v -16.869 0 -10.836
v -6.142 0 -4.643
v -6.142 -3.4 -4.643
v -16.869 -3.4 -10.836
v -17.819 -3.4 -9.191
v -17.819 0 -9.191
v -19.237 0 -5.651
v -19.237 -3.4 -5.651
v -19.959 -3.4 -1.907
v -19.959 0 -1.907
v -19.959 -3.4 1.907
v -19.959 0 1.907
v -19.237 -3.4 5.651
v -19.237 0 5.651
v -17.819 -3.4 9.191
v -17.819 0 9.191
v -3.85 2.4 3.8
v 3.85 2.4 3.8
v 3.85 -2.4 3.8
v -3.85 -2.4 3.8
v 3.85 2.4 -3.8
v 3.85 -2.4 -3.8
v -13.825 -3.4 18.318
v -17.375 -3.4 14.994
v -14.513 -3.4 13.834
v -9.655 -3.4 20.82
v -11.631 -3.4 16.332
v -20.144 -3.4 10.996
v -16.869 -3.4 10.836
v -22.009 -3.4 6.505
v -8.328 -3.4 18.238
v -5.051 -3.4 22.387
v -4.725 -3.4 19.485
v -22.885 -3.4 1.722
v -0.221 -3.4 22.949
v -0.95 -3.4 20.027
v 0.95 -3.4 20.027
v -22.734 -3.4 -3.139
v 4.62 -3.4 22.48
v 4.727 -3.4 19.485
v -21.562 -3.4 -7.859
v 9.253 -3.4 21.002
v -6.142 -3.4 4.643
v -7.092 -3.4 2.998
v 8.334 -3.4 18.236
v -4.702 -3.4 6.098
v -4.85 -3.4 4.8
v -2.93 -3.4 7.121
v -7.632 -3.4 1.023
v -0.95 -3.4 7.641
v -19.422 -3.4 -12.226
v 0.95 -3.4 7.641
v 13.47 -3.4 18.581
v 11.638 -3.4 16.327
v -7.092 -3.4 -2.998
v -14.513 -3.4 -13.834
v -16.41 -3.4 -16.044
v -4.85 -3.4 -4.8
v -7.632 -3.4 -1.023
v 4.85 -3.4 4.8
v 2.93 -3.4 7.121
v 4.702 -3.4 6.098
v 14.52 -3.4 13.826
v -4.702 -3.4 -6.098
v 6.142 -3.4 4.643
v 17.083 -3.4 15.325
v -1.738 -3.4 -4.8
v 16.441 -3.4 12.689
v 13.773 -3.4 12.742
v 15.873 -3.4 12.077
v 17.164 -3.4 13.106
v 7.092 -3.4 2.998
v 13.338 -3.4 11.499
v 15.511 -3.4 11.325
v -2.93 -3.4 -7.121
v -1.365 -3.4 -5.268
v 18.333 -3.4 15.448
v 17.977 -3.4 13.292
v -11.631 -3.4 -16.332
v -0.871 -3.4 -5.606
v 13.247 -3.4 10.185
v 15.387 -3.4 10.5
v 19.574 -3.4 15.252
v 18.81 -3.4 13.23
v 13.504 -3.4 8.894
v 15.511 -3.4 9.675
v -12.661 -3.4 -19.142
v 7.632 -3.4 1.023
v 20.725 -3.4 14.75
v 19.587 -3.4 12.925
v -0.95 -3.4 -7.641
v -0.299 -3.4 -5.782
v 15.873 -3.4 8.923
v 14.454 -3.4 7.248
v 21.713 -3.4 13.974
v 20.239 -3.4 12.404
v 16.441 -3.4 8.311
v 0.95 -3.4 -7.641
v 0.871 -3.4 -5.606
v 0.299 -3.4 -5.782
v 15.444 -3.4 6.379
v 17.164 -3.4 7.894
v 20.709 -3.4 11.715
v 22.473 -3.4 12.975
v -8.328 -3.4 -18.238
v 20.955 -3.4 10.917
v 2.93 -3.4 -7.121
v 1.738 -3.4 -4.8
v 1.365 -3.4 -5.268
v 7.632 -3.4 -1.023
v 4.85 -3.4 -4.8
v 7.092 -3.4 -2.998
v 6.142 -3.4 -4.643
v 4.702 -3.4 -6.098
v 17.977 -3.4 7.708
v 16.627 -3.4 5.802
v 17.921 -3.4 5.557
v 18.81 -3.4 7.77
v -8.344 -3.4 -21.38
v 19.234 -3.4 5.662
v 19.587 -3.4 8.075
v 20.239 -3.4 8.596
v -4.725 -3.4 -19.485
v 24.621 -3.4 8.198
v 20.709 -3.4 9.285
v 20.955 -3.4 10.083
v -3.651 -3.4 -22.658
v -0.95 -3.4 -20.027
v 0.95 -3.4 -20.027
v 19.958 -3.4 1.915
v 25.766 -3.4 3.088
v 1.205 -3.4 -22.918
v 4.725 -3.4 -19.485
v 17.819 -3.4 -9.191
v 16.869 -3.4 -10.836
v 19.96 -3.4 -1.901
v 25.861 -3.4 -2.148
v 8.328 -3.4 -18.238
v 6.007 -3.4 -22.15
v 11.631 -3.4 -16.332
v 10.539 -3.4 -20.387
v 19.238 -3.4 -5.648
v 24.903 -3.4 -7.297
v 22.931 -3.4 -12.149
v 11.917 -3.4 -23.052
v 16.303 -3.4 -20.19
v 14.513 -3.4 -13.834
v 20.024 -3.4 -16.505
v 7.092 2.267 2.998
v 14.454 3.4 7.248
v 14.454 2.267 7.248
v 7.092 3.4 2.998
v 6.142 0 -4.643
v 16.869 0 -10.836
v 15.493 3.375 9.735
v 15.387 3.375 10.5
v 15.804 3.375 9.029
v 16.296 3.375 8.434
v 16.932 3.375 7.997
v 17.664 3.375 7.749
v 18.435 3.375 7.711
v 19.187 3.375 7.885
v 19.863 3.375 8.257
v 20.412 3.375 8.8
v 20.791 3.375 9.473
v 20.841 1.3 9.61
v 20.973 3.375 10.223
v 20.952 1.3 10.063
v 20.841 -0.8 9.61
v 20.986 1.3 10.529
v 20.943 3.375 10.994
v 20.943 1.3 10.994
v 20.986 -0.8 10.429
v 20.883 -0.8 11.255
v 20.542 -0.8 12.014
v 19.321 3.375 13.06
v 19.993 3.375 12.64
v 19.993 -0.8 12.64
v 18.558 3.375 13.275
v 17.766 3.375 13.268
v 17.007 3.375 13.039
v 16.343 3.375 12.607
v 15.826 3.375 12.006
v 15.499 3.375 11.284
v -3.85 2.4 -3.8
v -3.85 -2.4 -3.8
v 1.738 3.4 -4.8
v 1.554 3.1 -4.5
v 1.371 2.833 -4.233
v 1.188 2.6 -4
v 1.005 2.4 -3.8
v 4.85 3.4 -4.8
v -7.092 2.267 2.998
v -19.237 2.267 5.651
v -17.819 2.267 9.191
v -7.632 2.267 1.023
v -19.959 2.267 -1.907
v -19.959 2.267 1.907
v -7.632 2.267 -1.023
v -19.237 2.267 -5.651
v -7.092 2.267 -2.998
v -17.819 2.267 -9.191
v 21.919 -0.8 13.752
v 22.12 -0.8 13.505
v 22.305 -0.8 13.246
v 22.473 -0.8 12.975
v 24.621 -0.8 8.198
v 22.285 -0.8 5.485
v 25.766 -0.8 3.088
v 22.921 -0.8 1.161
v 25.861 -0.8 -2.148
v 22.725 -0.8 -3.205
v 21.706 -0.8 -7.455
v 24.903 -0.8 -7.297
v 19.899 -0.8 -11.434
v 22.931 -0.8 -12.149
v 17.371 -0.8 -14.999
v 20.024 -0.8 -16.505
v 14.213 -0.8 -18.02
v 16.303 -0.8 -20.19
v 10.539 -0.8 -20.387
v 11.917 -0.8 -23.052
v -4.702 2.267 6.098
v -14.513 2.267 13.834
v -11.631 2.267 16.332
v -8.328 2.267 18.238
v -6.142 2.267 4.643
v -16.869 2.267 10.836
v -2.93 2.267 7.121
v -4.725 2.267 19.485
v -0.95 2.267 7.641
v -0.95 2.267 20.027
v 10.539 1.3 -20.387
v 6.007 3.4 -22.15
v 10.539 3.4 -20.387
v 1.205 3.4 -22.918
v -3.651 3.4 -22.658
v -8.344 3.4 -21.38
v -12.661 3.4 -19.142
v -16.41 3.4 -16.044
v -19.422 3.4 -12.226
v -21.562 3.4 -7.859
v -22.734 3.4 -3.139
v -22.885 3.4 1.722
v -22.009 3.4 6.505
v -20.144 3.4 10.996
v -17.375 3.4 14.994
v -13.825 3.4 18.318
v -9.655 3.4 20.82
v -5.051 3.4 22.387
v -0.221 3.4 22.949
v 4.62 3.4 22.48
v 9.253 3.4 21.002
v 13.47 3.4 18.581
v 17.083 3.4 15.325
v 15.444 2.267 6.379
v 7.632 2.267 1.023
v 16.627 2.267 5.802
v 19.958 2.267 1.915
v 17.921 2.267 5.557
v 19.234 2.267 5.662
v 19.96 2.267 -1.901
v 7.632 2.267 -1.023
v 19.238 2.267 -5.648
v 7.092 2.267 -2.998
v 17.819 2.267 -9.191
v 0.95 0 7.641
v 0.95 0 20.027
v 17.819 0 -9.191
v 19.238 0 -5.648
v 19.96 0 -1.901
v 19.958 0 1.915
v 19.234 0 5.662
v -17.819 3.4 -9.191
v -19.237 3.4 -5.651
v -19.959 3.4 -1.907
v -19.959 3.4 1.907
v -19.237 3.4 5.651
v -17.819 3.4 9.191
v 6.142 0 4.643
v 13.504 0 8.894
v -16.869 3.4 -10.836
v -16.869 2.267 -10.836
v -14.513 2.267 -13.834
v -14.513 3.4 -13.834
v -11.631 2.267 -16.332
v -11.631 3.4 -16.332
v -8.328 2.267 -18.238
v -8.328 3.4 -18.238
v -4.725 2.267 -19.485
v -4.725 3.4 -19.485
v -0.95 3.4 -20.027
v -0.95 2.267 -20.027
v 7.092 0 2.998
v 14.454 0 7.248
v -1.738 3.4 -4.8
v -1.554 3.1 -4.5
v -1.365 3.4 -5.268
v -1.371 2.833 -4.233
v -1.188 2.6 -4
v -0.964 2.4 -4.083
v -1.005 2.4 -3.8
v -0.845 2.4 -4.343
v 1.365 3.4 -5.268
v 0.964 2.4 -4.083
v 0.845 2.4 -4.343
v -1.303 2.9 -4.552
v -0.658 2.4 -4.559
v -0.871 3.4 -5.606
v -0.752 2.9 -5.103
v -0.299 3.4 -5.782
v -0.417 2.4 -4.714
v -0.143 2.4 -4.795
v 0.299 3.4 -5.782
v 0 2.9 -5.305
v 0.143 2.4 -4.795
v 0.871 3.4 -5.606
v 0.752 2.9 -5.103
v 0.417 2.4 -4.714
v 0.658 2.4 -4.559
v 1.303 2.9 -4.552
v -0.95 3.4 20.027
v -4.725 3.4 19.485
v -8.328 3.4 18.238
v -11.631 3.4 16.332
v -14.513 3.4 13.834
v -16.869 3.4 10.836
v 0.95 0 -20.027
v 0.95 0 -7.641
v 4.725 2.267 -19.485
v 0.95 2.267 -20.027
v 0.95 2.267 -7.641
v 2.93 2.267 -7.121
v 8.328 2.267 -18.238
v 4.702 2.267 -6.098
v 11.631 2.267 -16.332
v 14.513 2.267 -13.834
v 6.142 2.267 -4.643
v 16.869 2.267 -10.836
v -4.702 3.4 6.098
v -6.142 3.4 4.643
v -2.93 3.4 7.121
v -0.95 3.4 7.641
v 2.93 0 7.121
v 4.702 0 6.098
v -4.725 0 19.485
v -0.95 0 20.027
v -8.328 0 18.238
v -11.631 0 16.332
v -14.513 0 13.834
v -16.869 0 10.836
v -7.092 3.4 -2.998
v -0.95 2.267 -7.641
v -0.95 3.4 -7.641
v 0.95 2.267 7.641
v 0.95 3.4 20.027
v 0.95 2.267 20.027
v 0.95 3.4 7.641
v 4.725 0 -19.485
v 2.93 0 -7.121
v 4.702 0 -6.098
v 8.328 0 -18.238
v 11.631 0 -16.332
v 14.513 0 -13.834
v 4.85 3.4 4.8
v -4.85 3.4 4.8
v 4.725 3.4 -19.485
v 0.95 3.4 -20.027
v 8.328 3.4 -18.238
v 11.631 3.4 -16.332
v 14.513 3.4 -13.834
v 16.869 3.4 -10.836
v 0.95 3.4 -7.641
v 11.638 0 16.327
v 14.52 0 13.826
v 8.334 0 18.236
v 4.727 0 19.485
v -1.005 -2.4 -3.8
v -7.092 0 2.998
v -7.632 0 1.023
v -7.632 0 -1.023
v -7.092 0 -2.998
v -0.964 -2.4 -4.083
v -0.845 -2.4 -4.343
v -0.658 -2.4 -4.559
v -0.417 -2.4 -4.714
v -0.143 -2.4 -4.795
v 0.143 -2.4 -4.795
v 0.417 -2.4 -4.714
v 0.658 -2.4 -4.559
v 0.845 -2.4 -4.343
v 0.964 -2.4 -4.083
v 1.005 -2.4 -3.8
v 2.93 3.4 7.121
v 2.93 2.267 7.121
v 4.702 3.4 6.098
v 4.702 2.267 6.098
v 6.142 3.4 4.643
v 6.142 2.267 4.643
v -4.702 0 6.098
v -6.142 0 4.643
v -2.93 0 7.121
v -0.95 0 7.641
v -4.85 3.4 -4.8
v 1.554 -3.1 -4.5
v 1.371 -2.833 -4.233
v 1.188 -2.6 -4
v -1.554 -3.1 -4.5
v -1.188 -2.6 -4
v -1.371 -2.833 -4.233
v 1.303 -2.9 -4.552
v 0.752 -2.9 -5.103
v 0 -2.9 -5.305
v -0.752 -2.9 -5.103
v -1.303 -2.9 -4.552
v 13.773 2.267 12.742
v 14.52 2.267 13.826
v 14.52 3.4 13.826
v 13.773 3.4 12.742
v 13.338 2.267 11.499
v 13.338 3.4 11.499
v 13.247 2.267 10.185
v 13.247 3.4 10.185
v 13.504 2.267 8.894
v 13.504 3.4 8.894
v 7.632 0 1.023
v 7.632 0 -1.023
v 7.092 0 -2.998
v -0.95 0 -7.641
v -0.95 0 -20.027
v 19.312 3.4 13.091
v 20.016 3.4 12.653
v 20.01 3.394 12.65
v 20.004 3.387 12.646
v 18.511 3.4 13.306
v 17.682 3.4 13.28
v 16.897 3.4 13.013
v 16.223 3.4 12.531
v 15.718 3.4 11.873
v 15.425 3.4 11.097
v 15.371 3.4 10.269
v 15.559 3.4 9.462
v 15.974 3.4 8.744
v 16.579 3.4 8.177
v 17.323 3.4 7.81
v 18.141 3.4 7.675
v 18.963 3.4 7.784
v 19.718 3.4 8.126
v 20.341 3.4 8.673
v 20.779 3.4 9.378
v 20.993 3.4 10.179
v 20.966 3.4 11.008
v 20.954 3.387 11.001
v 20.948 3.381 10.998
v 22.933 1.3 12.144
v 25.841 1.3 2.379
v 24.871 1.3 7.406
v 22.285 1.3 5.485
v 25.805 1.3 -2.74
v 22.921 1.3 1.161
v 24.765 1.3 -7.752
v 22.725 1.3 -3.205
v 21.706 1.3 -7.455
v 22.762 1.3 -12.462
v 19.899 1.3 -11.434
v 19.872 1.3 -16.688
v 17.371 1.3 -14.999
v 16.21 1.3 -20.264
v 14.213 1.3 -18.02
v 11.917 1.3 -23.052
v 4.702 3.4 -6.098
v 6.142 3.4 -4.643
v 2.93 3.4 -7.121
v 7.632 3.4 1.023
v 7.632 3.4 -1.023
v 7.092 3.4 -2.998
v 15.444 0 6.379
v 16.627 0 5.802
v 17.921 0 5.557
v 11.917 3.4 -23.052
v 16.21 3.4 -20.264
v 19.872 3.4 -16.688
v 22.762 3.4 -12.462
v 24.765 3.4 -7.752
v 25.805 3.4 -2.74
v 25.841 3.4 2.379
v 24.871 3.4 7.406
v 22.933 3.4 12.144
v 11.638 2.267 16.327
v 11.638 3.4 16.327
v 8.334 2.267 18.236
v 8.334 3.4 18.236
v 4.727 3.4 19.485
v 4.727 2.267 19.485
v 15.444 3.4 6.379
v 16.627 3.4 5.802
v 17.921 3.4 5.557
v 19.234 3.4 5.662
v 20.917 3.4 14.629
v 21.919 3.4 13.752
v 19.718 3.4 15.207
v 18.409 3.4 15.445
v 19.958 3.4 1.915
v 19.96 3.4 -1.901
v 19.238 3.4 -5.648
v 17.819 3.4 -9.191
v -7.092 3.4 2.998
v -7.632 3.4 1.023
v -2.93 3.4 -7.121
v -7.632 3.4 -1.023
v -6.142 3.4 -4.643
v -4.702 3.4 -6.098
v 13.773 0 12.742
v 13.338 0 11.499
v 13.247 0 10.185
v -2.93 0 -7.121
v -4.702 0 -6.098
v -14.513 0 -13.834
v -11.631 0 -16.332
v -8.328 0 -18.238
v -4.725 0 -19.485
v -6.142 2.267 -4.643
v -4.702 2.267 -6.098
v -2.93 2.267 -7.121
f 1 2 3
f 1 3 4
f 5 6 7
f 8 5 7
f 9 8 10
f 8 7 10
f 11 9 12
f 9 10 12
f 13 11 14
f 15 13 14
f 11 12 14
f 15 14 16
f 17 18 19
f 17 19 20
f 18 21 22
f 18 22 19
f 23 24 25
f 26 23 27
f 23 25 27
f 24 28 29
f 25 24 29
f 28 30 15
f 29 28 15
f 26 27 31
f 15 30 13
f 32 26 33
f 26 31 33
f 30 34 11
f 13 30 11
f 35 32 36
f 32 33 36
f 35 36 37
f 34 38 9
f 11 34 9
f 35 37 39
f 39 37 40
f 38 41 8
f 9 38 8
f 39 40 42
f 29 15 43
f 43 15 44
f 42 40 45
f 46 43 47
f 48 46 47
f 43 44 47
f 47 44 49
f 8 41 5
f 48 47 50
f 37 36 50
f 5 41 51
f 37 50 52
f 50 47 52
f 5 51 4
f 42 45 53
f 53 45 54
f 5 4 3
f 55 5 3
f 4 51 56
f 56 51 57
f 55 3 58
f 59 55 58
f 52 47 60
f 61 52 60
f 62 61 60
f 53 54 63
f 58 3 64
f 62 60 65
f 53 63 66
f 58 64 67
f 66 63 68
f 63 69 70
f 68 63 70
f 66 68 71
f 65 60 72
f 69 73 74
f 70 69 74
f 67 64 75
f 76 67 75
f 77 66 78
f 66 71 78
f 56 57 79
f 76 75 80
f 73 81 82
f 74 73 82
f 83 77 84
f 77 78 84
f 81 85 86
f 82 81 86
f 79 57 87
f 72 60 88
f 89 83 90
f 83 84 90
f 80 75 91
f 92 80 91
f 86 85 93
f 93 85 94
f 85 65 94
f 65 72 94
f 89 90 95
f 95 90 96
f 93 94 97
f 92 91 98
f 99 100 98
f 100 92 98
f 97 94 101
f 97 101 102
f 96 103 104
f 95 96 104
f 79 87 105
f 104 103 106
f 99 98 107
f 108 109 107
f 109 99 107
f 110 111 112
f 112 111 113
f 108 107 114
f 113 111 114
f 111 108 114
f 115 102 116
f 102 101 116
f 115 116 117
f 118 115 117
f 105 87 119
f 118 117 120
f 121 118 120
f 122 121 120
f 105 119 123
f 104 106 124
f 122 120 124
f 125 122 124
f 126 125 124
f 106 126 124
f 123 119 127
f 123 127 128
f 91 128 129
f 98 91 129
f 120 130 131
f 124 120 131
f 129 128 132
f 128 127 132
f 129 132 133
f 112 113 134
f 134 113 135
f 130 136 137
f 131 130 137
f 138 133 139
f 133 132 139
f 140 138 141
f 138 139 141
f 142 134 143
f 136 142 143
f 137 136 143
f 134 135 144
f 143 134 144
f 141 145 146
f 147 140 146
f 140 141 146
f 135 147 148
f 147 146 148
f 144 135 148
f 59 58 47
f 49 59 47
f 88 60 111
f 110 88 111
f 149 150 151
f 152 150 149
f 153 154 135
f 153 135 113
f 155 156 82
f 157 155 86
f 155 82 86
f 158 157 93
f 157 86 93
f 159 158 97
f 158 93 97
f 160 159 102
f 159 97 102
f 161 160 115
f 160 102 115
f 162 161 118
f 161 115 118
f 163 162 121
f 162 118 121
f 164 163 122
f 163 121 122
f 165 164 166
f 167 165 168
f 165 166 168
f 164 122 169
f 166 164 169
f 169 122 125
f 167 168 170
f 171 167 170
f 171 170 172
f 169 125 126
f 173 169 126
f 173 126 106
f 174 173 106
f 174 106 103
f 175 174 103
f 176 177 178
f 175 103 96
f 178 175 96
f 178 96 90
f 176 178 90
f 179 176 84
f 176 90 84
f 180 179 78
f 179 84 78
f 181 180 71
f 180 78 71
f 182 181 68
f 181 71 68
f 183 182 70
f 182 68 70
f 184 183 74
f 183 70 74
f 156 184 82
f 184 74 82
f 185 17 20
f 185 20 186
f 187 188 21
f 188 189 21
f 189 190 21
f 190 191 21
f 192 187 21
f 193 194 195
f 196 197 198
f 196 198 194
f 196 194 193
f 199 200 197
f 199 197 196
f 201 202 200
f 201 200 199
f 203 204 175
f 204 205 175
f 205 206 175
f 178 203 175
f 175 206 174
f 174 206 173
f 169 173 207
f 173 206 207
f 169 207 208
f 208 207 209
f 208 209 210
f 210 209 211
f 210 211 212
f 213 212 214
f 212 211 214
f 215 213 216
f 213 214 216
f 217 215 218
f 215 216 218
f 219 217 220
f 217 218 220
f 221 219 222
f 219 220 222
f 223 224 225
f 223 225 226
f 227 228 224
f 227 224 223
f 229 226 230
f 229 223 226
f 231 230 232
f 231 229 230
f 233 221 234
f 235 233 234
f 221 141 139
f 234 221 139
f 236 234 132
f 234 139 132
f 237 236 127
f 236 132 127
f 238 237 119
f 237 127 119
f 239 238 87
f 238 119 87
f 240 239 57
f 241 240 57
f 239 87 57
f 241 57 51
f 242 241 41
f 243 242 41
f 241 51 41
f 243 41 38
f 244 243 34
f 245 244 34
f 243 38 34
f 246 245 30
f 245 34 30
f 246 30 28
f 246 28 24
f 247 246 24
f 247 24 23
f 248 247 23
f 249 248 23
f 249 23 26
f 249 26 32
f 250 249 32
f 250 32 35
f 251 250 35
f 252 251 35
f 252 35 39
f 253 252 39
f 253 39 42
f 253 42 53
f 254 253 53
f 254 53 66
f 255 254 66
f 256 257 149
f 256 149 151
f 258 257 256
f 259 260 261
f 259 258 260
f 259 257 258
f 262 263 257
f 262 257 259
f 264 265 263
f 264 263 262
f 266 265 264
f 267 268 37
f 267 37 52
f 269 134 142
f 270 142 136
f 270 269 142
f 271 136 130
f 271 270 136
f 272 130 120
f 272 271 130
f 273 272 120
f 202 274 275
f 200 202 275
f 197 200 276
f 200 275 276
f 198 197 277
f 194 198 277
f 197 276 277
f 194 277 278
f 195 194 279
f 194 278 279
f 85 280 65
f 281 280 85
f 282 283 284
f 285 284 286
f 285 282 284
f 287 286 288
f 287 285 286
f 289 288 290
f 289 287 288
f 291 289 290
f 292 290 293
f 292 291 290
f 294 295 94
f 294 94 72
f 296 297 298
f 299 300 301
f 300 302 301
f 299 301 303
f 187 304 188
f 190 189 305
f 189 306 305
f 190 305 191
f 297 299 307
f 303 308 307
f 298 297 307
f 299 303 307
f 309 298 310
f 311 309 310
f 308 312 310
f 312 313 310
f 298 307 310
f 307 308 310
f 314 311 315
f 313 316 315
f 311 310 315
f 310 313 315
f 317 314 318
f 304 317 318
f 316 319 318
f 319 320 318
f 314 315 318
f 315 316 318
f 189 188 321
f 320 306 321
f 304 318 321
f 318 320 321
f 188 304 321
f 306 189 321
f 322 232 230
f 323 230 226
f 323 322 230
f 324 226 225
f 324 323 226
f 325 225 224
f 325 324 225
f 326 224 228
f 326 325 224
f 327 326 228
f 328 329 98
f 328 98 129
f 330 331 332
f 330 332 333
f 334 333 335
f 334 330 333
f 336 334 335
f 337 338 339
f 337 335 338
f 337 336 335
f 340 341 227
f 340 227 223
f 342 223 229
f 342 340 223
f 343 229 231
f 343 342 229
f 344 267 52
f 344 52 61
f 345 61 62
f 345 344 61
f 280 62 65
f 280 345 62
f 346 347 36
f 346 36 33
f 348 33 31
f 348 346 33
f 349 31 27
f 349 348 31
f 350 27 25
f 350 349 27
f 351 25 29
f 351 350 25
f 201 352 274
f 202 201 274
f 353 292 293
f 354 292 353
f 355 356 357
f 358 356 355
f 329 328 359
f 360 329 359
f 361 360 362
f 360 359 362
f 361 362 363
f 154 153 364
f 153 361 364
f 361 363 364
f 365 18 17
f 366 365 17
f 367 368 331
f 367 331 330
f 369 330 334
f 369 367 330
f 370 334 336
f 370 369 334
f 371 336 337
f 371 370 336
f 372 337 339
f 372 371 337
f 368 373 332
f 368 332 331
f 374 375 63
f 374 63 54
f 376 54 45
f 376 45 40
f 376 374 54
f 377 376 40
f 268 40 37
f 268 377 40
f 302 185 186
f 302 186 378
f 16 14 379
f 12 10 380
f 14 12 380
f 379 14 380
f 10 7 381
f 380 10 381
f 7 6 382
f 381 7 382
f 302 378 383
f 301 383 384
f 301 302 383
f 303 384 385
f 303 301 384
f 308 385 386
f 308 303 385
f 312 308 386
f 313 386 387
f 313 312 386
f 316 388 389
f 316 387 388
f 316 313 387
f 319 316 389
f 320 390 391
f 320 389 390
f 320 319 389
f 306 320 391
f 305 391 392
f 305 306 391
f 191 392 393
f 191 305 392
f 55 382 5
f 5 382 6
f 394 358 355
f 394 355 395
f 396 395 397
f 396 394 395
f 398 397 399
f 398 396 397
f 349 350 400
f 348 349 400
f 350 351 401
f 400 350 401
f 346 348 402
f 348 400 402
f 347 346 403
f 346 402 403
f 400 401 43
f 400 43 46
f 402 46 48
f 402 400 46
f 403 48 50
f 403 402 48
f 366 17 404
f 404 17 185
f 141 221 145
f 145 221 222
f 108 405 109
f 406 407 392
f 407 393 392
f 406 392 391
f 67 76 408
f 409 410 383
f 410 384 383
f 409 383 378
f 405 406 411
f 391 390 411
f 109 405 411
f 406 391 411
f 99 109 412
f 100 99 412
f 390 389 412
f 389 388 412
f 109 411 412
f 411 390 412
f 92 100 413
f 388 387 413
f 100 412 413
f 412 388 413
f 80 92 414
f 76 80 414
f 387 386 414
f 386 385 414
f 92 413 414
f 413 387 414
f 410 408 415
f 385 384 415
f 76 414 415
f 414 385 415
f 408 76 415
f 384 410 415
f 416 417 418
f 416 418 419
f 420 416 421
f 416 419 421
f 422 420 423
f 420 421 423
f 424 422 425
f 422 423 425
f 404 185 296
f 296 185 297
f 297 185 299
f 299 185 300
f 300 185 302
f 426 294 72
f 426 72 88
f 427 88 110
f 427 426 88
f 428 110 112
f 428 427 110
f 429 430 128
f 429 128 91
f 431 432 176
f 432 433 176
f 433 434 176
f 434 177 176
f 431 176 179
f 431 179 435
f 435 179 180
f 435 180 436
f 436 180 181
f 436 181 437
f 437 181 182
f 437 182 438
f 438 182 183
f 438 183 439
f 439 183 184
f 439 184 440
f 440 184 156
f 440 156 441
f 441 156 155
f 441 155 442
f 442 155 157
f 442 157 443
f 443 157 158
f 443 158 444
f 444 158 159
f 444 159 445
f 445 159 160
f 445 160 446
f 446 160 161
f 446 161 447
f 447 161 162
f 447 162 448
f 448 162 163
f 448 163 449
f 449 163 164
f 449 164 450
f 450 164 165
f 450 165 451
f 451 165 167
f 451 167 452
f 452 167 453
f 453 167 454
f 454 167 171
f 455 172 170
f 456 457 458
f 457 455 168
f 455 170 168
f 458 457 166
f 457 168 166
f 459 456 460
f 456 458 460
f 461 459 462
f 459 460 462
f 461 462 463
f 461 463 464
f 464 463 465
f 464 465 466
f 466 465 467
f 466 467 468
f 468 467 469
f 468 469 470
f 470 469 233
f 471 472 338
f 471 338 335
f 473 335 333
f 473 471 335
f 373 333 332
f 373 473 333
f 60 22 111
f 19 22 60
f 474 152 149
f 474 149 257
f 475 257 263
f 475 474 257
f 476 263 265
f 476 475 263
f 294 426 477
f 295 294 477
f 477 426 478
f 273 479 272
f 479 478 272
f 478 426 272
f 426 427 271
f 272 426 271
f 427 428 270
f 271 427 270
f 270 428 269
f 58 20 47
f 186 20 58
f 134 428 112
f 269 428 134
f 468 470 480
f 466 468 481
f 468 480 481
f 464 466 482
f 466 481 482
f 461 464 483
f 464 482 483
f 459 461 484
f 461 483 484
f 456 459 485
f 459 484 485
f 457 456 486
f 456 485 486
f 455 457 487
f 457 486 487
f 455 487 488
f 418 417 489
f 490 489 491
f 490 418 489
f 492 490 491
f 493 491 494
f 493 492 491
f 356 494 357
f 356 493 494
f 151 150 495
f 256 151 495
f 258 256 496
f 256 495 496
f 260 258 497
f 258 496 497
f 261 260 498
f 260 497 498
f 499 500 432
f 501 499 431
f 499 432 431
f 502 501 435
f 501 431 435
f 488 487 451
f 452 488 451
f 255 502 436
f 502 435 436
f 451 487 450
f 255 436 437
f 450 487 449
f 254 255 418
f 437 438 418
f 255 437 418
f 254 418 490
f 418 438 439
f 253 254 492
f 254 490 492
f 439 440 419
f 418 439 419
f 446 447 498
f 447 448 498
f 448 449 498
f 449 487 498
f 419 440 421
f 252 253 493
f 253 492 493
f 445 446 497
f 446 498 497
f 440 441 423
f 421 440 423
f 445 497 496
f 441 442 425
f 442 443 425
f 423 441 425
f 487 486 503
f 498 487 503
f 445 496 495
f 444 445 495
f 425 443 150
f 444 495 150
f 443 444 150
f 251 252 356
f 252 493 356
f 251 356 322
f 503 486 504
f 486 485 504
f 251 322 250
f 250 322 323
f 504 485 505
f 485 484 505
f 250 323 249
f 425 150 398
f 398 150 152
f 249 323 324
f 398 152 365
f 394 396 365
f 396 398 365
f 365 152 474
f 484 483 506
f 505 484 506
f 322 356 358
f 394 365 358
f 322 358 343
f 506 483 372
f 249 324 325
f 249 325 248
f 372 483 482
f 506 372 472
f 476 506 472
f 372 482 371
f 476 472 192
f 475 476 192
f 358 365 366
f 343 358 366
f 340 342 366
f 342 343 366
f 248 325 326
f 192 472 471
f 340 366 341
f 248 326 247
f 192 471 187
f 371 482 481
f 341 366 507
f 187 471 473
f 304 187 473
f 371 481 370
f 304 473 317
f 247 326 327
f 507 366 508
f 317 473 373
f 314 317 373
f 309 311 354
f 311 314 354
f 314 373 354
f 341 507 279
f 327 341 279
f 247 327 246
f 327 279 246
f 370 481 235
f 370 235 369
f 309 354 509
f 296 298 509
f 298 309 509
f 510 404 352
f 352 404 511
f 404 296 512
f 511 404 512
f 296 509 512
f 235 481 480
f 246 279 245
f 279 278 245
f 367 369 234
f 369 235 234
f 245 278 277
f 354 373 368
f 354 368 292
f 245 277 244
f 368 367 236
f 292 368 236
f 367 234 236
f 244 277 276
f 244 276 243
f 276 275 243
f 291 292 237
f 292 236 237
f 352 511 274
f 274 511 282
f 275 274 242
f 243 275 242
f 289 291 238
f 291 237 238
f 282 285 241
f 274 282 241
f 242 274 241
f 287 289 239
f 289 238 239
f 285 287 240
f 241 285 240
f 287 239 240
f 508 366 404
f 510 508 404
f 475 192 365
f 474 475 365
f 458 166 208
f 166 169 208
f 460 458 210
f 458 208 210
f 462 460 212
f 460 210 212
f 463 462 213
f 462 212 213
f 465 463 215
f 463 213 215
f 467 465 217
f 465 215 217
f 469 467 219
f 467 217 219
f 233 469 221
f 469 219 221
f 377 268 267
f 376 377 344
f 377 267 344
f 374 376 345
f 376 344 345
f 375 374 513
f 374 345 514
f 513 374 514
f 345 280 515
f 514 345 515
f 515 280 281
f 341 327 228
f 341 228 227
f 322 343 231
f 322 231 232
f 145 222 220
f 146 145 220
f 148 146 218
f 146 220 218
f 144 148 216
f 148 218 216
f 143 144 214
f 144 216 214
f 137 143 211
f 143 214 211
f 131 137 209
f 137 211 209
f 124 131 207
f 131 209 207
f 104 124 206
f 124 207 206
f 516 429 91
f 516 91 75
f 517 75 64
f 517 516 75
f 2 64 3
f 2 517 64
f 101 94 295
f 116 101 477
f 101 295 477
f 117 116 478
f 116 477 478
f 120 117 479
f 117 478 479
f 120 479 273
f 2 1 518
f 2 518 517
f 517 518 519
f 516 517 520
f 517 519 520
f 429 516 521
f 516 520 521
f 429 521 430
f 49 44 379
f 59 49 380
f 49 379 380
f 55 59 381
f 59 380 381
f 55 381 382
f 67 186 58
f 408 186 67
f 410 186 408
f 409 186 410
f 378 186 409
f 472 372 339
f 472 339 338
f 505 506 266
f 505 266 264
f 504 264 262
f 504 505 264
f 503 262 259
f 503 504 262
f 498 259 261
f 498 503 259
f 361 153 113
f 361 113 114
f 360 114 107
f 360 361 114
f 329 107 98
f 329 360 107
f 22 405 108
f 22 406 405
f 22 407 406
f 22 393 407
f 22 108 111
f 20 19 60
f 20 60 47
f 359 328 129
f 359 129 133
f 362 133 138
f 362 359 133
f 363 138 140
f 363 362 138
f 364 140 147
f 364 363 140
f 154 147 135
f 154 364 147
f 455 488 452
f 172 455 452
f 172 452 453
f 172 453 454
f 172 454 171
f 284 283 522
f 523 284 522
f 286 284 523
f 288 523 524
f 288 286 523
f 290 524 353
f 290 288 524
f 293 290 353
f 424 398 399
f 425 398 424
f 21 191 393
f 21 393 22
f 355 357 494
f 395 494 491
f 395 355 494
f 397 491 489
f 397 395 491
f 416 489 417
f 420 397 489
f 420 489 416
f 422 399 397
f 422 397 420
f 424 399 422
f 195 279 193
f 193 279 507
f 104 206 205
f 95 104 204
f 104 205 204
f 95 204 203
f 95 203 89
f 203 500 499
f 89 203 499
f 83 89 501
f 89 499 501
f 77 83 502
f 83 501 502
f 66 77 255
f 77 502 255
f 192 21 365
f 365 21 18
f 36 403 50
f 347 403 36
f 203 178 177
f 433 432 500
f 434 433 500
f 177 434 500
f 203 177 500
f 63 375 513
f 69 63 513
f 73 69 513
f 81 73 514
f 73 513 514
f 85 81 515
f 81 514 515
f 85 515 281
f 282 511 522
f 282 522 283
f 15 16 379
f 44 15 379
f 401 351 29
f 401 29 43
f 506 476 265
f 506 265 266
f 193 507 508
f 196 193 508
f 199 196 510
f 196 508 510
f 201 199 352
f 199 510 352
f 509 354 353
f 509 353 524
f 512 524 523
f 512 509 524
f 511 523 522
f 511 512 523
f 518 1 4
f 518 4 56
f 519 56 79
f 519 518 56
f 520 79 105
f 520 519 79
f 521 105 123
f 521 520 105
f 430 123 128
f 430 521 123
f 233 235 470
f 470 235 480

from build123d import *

# Parameters (mm, degrees)
ESBO_O1_R                              = 22.95
RESSALTO_EXTRUS_O1_DEPTH               = 3.4
ESBO_O2_R                              = 22.95
RESSALTO_EXTRUS_O2_DEPTH               = 2.266666667
CORTE_EXTRUS_O1_DEPTH                  = 7.8
CHANFRO1_SIZE                          = 1
RESSALTO_EXTRUS_O3_DEPTH               = 6.8
FURO_DE_DI_METRO_5_6_5_6_1_D           = 5.6
FURO_DE_DI_METRO_5_6_5_6_1_DEPTH       = 10
FURO_DE_DI_METRO_5_6_5_6_1_CSINK_D     = 5.65
FURO_DE_DI_METRO_5_6_5_6_1_CSINK_ANGLE = 90
FURO_DE_DI_METRO_5_6_5_6_1_TIP         = 1.682409733
ESBO_O8_W                              = 7.937144563
ESBO_O8_H                              = 2.1
CORTE_EXTRUS_O2_DEPTH                  = 4.2


with BuildPart() as part:
    # Esboço1 → Ressalto-extrusão1 (new body, symmetric)
    with BuildSketch(Plane(origin=(0, 0, 0), x_dir=(1, 0, 0), z_dir=(0, 1, 0))):
        Circle(ESBO_O1_R)
        with BuildLine():
            Line((-7.092448526, 2.997861554), (-17.819307423, 9.191016426))
            ThreePointArc((-17.819307423, 9.191016426), (-20.05, 0), (-17.819307423, -9.191016426))
            Line((-17.819307423, -9.191016426), (-7.092448526, -2.997861554))
            ThreePointArc((-7.092448526, -2.997861554), (-7.7, 0), (-7.092448526, 2.997861554))
        make_face(mode=Mode.SUBTRACT)
        with BuildLine():
            Line((-6.142448526, 4.643309822), (-16.869307423, 10.836464693))
            ThreePointArc((-16.869307423, 10.836464693), (-10.025, 17.363809346), (-0.95, 20.02748112))
            Line((-0.95, 20.02748112), (-0.95, 7.641171376))
            ThreePointArc((-0.95, 7.641171376), (-3.85, 6.668395609), (-6.142448526, 4.643309822))
        make_face(mode=Mode.SUBTRACT)
        with BuildLine():
            Line((0.95, 7.641171376), (0.95, 20.02748112))
            ThreePointArc((0.95, 20.02748112), (10.025, 17.363809346), (16.869307423, 10.836464693))
            Line((16.869307423, 10.836464693), (6.142448526, 4.643309822))
            ThreePointArc((6.142448526, 4.643309822), (3.85, 6.668395609), (0.95, 7.641171376))
        make_face(mode=Mode.SUBTRACT)
        with BuildLine():
            Line((7.092448526, 2.997861554), (17.819307423, 9.191016426))
            ThreePointArc((17.819307423, 9.191016426), (20.05, 0), (17.819307423, -9.191016426))
            Line((17.819307423, -9.191016426), (7.092448526, -2.997861554))
            ThreePointArc((7.092448526, -2.997861554), (7.7, 0), (7.092448526, 2.997861554))
        make_face(mode=Mode.SUBTRACT)
        with BuildLine():
            Line((6.142448526, -4.643309822), (16.869307423, -10.836464693))
            ThreePointArc((16.869307423, -10.836464693), (10.025, -17.363809346), (0.95, -20.02748112))
            Line((0.95, -20.02748112), (0.95, -7.641171376))
            ThreePointArc((0.95, -7.641171376), (3.85, -6.668395609), (6.142448526, -4.643309822))
        make_face(mode=Mode.SUBTRACT)
        with BuildLine():
            Line((-0.95, -7.641171376), (-0.95, -20.02748112))
            ThreePointArc((-0.95, -20.02748112), (-10.025, -17.363809346), (-16.869307423, -10.836464693))
            Line((-16.869307423, -10.836464693), (-6.142448526, -4.643309822))
            ThreePointArc((-6.142448526, -4.643309822), (-3.85, -6.668395609), (-0.95, -7.641171376))
        make_face(mode=Mode.SUBTRACT)
    extrude(amount=RESSALTO_EXTRUS_O1_DEPTH, both=True)

    # Esboço2 → Ressalto-extrusão2 (add)
    with BuildSketch(Plane(origin=(0, 0, 0), x_dir=(1, 0, 0), z_dir=(0, 1, 0))):
        Circle(ESBO_O2_R)
    extrude(amount=RESSALTO_EXTRUS_O2_DEPTH)

    # Esboço3 → Corte-extrusão1 (cut, through all)
    with BuildSketch(Plane(origin=(0, 3.4, 0), x_dir=(1, 0, 0), z_dir=(0, 1, 0))):
        with BuildLine():
            Line((1.00475453, 3.8), (3.85, 3.8))
            Line((3.85, 3.8), (3.85, -3.8))
            Line((3.85, -3.8), (-3.85, -3.8))
            Line((-3.85, -3.8), (-3.85, 3.8))
            Line((-3.85, 3.8), (-1.00475453, 3.8))
            ThreePointArc((-1.00475453, 3.8), (0, 4.80475453), (1.00475453, 3.8))
        make_face()
    extrude(amount=-CORTE_EXTRUS_O1_DEPTH, mode=Mode.SUBTRACT)

    # Chanfro1
    chanfro1_edges = [part.edges().sort_by_distance(p)[0] for p in [
        (3.85, -3.4, 0),
        (0, -3.4, 3.8),
        (-3.85, -3.4, 0),
        (-2.427377265, -3.4, -3.8),
        (0, -3.4, -4.80475453),
        (2.427377265, -3.4, -3.8),
        (3.85, 3.4, 0),
        (2.427377265, 3.4, -3.8),
        (0, 3.4, -4.80475453),
        (-2.427377265, 3.4, -3.8),
        (-3.85, 3.4, 0),
        (0, 3.4, 3.8),
    ]]
    chamfer(chanfro1_edges, length=CHANFRO1_SIZE)

    # Esboço4 → Ressalto-extrusão3 (add)
    with BuildSketch(Plane(origin=(0, 3.4, 0), x_dir=(1, 0, 0), z_dir=(0, 1, 0))):
        with BuildLine():
            Line((9.207366783, 17.810864576), (11.916766484, 23.05196687))
            ThreePointArc((11.916766484, 23.05196687), (24.902926978, 7.297035556), (22.473359228, -12.975))
            ThreePointArc((22.473359228, -12.975), (13.660702639, -12.504832962), (19.233912303, -5.66207714))
            ThreePointArc((19.233912303, -5.66207714), (18.438311669, 7.875986466), (9.207366783, 17.810864576))
        make_face()
    extrude(amount=-RESSALTO_EXTRUS_O3_DEPTH)

    # Furo de diâmetro Ø5.6 (5.6)1
    with Locations(Plane(origin=(0, 3.4, 0), x_dir=(1, 0, 0), z_dir=(0, 1, 0))):
        with Locations((18.186533479, -10.5)):
            CounterSinkHole(FURO_DE_DI_METRO_5_6_5_6_1_D / 2, FURO_DE_DI_METRO_5_6_5_6_1_CSINK_D / 2, depth=FURO_DE_DI_METRO_5_6_5_6_1_DEPTH, counter_sink_angle=FURO_DE_DI_METRO_5_6_5_6_1_CSINK_ANGLE)
            with Locations((0, 0, -(FURO_DE_DI_METRO_5_6_5_6_1_DEPTH + FURO_DE_DI_METRO_5_6_5_6_1_TIP / 2))):  # 118° drill point
                Cone(0, FURO_DE_DI_METRO_5_6_5_6_1_D / 2, FURO_DE_DI_METRO_5_6_5_6_1_TIP, mode=Mode.SUBTRACT)

    # Varredura de corte1: sweep along a path in Esboço7
    with BuildLine(Plane(origin=(0, 0, 0), x_dir=(1, 0, 0), z_dir=(0, 1, 0))) as varredura_de_corte1_path:
        ThreePointArc((19.875283017, -11.475), (19.875283017, 11.475), (0, 22.95))
    # Esboço8 → Varredura de corte1 (sweep, cut)
    with BuildSketch(Plane(origin=(0, 0, 0), x_dir=(0, 0, -1), z_dir=(1, 0, 0))):
        with Locations((26.918572282, 0.25)):
            Rectangle(ESBO_O8_W, ESBO_O8_H)
    sweep(path=varredura_de_corte1_path.line, mode=Mode.SUBTRACT)

    # Esboço9 → Corte-extrusão2 (cut)
    with BuildSketch(Plane(origin=(0, 3.4, 0), x_dir=(1, 0, 0), z_dir=(0, 1, 0))):
        Polygon((18.147037743, -11.574162637), (23.041410617, -14.399930134), (24.539064474, -13.070669968), (18.226029216, -9.425837363), align=None)
    extrude(amount=-CORTE_EXTRUS_O2_DEPTH, mode=Mode.SUBTRACT)


solid = part.part
